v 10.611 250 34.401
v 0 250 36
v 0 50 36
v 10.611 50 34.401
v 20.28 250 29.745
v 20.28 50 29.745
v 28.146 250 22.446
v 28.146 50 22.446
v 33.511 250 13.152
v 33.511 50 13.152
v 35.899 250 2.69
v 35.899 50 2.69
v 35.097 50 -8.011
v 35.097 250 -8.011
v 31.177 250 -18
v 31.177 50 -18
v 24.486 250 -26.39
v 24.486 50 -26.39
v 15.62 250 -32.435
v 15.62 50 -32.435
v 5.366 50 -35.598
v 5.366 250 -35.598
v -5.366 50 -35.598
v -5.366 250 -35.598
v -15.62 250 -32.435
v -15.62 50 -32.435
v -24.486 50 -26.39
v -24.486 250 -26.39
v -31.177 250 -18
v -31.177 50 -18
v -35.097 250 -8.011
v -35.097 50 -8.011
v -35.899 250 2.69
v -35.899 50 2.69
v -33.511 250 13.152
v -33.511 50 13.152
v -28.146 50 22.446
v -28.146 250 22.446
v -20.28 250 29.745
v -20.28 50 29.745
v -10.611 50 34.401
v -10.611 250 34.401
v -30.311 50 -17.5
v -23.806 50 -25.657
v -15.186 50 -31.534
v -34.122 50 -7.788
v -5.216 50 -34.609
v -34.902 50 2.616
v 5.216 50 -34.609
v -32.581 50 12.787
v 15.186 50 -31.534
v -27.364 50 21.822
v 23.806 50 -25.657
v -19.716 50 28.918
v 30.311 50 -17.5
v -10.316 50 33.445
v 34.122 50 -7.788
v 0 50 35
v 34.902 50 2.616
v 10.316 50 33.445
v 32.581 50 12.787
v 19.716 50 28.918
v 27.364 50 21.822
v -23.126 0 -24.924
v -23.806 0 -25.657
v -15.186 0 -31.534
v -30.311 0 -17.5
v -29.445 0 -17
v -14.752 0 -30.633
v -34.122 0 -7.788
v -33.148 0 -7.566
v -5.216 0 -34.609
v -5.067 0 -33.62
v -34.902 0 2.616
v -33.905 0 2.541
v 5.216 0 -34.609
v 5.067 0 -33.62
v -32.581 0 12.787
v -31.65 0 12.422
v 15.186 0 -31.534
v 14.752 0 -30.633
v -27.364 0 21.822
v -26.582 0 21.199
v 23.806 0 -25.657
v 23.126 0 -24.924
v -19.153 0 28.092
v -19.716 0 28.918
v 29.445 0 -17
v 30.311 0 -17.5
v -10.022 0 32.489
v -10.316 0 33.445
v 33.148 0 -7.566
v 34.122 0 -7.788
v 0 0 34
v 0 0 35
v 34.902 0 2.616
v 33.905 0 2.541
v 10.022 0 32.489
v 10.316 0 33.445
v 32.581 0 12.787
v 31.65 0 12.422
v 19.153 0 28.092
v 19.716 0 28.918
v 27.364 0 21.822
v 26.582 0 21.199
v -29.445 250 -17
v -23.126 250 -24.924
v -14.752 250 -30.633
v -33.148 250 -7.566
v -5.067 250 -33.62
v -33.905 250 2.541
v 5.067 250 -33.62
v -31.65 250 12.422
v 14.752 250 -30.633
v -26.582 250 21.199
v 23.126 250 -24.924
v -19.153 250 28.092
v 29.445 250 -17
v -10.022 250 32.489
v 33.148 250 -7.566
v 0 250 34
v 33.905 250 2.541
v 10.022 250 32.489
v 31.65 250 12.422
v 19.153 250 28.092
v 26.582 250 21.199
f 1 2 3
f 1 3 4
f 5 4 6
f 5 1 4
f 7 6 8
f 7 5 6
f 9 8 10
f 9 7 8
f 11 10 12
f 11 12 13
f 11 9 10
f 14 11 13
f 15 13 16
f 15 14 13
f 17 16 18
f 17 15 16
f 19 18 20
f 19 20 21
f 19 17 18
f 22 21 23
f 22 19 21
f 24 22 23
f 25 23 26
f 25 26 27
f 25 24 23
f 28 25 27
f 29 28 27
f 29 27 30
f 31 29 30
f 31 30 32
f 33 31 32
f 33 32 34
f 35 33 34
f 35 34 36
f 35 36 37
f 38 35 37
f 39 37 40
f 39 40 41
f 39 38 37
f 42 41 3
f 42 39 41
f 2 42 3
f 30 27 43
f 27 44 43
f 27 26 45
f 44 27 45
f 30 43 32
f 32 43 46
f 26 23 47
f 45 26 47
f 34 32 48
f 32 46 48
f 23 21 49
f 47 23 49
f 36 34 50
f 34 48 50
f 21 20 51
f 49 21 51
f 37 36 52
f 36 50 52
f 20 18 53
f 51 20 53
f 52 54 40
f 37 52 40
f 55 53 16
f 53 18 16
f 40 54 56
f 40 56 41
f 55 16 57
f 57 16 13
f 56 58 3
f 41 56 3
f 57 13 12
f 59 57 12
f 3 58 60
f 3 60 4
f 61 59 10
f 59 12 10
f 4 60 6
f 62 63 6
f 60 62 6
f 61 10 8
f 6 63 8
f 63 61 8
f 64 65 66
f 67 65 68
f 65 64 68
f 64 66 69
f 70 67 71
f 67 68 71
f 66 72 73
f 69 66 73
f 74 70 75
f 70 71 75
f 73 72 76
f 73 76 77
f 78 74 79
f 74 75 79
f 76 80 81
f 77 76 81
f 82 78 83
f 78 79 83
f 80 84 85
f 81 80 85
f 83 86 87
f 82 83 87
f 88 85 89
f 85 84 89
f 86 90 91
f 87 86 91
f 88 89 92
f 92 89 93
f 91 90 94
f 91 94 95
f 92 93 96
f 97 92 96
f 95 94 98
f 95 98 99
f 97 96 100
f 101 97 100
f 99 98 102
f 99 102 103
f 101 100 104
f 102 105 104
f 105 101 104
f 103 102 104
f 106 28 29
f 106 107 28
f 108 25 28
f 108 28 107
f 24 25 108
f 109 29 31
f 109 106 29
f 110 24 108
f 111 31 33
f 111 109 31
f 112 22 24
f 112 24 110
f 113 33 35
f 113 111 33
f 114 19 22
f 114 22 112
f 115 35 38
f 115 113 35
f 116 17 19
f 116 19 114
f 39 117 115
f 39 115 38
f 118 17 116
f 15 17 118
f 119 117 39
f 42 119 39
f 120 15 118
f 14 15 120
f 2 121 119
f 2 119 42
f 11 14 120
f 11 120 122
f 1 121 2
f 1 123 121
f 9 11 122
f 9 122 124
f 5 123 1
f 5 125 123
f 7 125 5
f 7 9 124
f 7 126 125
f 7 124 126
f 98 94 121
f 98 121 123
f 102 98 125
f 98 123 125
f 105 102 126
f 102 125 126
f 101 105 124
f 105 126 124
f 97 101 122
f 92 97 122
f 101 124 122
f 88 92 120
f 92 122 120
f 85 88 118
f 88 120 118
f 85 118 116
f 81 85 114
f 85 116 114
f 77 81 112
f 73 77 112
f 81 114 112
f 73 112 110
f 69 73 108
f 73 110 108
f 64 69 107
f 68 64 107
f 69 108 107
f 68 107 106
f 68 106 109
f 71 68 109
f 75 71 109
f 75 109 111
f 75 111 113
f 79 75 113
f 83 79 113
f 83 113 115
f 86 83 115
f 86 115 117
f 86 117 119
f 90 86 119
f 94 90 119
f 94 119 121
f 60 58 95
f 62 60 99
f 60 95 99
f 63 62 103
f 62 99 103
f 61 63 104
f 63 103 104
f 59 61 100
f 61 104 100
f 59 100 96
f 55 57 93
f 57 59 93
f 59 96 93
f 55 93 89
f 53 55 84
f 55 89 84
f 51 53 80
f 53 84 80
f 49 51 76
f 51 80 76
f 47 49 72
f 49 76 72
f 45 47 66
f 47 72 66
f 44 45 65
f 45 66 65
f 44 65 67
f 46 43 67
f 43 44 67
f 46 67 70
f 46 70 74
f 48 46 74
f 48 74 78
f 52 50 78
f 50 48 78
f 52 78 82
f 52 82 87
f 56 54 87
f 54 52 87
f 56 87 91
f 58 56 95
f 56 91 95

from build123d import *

# Parameters (mm, degrees)
ESQUISSE1_R             = 35
BOSS_EXTRU_2_DEPTH      = 250
ESQUISSE4_R             = 34
ENL_V_MAT_EXTRU_3_DEPTH = 250
ESQUISSE5_R             = 36
BOSS_EXTRU_5_DEPTH      = 200
ESQUISSE6_R             = 34
ENL_V_MAT_EXTRU_4_DEPTH = 200


with BuildPart() as part:
    # Esquisse1 → Boss.-Extru.2 (new body)
    with BuildSketch(Plane(origin=(0, 0, 0), x_dir=(1, 0, 0), z_dir=(0, 1, 0))):
        with Locations(Location((0, 0, 0), (0, 0, 270))):
            Circle(ESQUISSE1_R)
    extrude(amount=BOSS_EXTRU_2_DEPTH)

    # Esquisse4 → Enlèv. mat.-Extru.3 (cut)
    with BuildSketch(Plane(origin=(0, 250, 0), x_dir=(1, 0, 0), z_dir=(0, 1, 0))):
        with Locations(Location((0, 0, 0), (0, 0, 270))):
            Circle(ESQUISSE4_R)
    extrude(amount=-ENL_V_MAT_EXTRU_3_DEPTH, mode=Mode.SUBTRACT)

    # Esquisse5 → Boss.-Extru.5 (add)
    with BuildSketch(Plane(origin=(0, 250, 0), x_dir=(1, 0, 0), z_dir=(0, 1, 0))):
        with Locations(Location((0, 0, 0), (0, 0, 270))):
            Circle(ESQUISSE5_R)
    extrude(amount=-BOSS_EXTRU_5_DEPTH)

    # Esquisse6 → Enlèv. mat.-Extru.4 (cut)
    with BuildSketch(Plane(origin=(0, 250, 0), x_dir=(1, 0, 0), z_dir=(0, 1, 0))):
        with Locations(Location((0, 0, 0), (0, 0, 270))):
            Circle(ESQUISSE6_R)
    extrude(amount=-ENL_V_MAT_EXTRU_4_DEPTH, mode=Mode.SUBTRACT)


solid = part.part
